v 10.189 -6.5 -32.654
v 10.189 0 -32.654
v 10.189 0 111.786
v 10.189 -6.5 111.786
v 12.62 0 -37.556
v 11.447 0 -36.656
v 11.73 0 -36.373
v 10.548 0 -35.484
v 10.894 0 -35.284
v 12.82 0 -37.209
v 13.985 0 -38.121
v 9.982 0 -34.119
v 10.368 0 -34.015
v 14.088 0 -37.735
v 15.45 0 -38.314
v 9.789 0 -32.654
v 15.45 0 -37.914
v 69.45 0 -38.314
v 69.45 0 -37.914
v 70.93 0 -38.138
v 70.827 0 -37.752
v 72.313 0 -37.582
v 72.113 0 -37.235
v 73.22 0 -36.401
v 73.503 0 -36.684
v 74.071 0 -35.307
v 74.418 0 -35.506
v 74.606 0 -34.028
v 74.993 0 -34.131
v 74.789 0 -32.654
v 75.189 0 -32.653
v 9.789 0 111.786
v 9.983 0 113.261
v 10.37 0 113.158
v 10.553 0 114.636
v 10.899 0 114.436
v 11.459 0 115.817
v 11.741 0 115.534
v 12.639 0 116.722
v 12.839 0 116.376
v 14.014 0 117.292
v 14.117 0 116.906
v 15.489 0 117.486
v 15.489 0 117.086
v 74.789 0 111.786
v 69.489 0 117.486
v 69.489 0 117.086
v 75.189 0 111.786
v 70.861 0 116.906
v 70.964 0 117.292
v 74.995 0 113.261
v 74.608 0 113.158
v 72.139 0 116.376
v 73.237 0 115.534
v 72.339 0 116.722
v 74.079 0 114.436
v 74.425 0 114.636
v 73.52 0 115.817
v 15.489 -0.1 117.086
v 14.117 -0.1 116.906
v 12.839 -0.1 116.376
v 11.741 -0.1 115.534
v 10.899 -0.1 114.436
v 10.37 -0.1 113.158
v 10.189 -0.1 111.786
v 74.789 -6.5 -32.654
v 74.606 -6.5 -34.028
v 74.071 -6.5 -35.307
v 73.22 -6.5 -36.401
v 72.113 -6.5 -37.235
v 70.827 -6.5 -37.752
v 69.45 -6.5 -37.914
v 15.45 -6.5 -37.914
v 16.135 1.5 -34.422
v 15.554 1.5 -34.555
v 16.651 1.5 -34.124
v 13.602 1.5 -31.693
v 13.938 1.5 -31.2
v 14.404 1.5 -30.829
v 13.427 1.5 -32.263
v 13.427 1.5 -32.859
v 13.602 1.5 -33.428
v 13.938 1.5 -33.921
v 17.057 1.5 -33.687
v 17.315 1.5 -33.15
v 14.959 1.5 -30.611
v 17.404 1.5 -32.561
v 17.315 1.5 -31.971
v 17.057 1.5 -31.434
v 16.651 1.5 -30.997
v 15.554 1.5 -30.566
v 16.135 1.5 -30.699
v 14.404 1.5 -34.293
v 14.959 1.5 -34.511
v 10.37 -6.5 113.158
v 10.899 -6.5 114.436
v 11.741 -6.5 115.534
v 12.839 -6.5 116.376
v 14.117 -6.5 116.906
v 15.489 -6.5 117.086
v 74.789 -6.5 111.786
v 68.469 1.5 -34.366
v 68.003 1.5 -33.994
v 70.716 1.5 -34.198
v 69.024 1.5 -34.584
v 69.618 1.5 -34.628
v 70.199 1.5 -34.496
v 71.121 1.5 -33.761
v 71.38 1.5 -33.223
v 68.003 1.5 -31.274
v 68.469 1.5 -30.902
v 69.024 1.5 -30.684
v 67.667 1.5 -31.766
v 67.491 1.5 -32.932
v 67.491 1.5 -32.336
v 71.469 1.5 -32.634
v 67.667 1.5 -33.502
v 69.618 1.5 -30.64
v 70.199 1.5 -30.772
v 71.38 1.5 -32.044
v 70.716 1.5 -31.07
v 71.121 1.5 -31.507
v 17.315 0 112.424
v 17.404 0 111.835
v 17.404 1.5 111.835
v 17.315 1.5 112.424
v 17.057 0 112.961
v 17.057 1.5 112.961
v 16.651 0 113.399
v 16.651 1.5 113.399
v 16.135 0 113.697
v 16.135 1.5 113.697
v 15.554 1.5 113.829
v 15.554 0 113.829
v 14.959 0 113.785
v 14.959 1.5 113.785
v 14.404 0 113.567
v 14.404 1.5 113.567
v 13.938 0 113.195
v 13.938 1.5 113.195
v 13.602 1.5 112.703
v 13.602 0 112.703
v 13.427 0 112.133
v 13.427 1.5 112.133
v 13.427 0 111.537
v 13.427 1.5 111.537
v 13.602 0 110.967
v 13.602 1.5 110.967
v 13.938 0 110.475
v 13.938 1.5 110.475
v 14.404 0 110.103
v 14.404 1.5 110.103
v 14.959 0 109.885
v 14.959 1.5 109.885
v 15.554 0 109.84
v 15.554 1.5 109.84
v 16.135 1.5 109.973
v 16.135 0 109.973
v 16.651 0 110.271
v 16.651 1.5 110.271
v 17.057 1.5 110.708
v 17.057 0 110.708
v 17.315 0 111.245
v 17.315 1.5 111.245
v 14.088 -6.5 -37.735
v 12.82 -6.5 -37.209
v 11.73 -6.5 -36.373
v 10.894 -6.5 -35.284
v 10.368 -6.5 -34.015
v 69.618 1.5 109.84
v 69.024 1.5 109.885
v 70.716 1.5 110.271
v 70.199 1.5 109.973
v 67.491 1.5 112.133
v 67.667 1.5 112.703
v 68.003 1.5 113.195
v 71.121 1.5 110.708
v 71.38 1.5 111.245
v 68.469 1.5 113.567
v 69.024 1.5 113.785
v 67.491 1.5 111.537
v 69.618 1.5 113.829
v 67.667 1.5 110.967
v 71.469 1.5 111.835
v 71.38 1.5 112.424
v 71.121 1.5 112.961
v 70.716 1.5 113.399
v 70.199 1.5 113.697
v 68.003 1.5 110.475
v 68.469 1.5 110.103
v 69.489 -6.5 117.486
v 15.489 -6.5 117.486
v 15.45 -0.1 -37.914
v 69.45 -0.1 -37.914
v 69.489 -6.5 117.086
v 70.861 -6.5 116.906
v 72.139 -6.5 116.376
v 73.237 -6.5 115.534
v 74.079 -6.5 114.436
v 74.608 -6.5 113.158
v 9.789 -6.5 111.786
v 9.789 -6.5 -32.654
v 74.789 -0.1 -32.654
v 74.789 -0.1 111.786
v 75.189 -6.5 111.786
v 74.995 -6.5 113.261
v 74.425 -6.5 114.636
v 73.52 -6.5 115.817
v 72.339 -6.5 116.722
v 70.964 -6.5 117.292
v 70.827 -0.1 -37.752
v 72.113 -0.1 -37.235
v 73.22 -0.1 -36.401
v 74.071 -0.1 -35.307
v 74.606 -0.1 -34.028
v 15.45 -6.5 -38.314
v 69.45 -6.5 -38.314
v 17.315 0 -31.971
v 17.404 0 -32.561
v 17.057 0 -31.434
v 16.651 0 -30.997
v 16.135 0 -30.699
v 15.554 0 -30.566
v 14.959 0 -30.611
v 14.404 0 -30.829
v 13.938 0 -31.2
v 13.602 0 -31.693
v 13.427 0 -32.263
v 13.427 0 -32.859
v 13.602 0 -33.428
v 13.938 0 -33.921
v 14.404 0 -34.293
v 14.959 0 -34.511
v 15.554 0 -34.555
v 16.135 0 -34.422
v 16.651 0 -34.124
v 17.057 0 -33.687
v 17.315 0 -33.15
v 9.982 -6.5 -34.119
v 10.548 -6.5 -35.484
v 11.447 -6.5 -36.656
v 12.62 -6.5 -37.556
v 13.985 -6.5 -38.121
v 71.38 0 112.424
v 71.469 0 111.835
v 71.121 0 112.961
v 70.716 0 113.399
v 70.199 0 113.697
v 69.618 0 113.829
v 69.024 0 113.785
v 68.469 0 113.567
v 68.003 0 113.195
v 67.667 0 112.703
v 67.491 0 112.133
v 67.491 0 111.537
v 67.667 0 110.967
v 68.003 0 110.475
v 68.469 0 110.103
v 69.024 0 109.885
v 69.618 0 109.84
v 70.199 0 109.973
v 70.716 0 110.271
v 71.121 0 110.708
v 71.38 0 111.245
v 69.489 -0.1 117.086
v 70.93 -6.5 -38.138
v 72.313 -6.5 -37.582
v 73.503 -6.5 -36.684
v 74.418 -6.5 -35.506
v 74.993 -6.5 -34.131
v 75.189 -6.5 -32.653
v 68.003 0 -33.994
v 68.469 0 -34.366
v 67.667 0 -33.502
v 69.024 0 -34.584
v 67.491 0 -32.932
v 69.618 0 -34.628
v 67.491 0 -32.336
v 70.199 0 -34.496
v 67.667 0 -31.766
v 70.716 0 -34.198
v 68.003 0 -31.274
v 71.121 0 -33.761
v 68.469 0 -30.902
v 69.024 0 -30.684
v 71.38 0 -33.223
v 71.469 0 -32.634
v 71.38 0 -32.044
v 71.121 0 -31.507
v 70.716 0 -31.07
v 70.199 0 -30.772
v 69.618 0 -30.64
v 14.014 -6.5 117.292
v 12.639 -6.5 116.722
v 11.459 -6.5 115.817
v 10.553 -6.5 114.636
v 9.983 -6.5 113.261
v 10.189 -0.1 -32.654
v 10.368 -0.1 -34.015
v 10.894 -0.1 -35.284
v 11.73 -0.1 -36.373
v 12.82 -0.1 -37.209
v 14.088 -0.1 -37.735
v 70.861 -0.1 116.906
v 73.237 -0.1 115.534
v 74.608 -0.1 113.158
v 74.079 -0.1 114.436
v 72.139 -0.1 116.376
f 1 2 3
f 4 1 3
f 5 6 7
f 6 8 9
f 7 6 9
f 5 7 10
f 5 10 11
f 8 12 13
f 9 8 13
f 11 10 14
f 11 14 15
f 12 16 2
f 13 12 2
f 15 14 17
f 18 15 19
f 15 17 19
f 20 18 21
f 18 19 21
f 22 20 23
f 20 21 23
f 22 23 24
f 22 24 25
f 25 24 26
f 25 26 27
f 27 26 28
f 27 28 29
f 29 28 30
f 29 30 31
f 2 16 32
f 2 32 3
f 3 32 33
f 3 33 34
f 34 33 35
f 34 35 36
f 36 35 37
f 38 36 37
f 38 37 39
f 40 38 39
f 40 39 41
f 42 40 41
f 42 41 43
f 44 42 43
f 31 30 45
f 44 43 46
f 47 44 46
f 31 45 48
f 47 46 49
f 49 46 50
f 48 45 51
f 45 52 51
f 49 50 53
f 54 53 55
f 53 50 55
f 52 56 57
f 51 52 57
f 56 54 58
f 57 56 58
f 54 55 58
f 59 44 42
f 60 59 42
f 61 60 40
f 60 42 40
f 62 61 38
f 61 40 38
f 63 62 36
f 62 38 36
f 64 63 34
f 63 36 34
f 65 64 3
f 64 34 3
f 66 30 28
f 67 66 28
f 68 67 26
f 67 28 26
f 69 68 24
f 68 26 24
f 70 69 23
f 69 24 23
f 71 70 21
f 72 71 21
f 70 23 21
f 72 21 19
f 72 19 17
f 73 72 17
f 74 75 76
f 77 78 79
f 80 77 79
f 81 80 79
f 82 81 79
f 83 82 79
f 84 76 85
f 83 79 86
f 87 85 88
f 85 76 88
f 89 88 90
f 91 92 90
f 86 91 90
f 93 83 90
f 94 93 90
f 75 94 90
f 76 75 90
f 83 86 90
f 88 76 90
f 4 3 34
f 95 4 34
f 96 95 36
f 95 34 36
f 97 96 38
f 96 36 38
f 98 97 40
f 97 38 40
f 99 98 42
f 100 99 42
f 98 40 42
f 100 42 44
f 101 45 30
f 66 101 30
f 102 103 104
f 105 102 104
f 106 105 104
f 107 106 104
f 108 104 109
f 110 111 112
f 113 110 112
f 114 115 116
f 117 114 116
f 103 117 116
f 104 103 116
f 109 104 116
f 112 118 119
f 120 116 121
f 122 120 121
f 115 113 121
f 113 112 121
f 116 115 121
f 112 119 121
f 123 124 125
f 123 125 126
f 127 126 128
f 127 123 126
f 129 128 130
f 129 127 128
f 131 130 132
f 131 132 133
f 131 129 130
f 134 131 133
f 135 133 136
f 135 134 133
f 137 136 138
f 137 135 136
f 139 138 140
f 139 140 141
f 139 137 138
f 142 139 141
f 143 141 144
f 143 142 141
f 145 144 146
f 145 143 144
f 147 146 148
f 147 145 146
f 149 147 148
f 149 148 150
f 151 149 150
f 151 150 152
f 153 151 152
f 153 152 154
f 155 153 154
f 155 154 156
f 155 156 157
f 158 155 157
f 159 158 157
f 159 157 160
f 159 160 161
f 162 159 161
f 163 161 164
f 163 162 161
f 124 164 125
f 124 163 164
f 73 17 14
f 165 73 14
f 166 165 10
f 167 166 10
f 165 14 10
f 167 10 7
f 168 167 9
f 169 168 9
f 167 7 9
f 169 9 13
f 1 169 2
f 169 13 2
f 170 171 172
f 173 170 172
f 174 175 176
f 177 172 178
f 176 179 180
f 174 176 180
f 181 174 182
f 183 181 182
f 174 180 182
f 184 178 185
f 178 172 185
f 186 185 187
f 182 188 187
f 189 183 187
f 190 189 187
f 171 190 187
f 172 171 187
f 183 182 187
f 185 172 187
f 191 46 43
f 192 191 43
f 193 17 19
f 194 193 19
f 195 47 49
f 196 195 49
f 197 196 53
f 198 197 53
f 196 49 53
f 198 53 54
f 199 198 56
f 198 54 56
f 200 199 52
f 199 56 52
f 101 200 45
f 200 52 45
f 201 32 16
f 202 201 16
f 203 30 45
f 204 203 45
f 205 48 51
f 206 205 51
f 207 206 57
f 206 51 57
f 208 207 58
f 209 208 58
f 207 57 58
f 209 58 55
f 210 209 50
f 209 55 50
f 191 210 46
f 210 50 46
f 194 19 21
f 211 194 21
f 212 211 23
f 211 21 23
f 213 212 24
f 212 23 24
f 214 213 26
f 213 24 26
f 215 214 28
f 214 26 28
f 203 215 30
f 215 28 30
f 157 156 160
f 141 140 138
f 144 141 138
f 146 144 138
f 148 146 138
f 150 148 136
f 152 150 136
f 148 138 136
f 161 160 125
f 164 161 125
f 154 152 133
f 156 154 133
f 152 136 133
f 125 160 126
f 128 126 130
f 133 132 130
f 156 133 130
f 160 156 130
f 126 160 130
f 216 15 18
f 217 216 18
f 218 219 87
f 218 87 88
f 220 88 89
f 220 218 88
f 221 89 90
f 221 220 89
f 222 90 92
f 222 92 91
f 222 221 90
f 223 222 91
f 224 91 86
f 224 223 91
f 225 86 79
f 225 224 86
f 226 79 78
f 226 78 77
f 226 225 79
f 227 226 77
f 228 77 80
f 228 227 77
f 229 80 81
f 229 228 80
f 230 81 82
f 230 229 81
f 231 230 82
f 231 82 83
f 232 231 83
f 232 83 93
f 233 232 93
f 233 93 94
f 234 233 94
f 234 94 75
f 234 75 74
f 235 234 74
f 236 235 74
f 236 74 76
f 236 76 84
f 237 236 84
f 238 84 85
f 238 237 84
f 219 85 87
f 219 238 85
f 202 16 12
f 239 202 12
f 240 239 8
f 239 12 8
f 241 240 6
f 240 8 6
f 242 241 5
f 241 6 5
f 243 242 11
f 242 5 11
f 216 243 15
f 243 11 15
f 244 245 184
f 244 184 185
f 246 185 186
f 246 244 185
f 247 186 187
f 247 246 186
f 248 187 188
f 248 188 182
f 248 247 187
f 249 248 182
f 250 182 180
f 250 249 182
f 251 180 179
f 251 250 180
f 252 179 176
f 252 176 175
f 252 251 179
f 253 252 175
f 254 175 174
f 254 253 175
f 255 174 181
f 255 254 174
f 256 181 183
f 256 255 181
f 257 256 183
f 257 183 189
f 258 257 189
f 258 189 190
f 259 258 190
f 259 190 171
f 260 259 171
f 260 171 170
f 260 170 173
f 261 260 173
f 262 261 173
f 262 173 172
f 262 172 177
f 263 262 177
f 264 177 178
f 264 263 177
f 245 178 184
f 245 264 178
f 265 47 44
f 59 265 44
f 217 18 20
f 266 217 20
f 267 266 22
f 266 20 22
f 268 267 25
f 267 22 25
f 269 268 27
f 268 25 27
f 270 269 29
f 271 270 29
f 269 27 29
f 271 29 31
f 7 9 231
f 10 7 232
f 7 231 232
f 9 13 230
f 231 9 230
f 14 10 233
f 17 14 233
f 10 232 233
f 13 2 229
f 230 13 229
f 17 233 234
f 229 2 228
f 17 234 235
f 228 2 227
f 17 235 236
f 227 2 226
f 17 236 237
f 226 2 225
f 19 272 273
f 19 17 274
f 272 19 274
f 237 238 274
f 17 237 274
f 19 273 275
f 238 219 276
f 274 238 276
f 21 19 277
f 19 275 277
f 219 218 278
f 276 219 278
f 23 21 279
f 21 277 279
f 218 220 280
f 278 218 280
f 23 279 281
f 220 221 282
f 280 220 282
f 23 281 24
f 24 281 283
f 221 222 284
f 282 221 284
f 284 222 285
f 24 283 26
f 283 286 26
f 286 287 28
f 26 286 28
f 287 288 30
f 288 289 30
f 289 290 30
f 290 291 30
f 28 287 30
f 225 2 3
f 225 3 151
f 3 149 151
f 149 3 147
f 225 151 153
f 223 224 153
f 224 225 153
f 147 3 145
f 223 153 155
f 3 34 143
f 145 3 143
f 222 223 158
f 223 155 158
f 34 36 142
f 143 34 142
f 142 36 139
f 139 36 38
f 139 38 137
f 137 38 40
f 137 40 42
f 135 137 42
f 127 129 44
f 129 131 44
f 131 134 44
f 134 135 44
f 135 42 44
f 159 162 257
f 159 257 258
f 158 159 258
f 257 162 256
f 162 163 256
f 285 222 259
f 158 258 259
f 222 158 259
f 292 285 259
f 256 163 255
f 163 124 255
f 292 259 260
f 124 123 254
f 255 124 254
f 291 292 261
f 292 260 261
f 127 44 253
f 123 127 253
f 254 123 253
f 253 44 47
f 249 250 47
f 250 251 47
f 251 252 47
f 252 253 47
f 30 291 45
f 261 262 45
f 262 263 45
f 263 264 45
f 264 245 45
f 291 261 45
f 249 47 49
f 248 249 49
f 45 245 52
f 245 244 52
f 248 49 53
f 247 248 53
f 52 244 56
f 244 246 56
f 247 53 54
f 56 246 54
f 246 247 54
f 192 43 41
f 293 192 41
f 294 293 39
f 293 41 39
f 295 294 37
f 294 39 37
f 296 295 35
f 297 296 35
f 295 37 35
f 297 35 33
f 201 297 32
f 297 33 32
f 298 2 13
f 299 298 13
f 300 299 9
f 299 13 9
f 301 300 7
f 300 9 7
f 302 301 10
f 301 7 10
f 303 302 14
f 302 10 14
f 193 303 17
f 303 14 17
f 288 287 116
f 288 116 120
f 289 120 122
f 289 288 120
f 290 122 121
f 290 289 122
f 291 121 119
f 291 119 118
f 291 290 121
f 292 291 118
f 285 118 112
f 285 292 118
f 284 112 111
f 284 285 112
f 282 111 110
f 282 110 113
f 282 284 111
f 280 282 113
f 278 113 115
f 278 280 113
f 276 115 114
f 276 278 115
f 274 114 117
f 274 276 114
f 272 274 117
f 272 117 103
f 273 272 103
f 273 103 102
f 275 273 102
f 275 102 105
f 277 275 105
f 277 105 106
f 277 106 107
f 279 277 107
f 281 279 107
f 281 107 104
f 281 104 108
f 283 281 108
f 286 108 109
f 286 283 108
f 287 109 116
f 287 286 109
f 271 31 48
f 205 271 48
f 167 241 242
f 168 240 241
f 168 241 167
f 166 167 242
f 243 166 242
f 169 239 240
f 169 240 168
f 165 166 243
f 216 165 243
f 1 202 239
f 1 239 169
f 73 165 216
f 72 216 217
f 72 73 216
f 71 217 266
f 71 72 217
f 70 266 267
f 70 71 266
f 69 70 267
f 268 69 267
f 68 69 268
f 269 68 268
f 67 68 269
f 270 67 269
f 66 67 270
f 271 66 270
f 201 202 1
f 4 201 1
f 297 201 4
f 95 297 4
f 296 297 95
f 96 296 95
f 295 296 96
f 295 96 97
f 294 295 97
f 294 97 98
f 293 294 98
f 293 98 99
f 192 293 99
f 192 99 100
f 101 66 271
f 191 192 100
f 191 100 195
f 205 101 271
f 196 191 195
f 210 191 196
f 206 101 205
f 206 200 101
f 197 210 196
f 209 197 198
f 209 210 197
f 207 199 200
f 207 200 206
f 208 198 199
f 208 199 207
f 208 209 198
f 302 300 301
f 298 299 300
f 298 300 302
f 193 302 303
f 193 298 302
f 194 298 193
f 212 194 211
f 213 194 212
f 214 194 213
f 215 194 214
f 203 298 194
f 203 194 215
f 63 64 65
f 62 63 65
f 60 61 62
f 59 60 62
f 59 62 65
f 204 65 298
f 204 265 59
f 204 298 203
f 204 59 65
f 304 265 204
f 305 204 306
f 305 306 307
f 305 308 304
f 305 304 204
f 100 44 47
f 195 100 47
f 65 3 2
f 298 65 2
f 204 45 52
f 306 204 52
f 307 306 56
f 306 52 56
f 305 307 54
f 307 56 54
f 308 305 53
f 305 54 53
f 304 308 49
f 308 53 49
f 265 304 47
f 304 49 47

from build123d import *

# Parameters (mm, degrees)
F2_DEPTH = 6.5
F3_DEPTH = 0.1
F1_R     = 2
F4_DEPTH = 1.5


with BuildPart() as f2:
    # F0 (on Front) → F2 (new body)
    with BuildSketch(Plane.XZ):
        with BuildLine():
            Line((9.789024, 111.786183), (9.789024, -32.653514))
            ThreePointArc((9.789024, -32.653514), (11.447287, -36.656048), (15.449991, -38.313902))
            Line((15.449991, -38.313902), (69.449991, -38.313943))
            ThreePointArc((69.449991, -38.313943), (73.503284, -36.683913), (75.189024, -32.65347))
            Line((75.189024, -32.65347), (75.189024, 111.786183))
            ThreePointArc((75.189024, 111.786183), (73.519525, 115.816634), (69.489059, 117.486098))
            Line((69.489059, 117.486098), (15.489059, 117.486098))
            ThreePointArc((15.489059, 117.486098), (11.458568, 115.816639), (9.789024, 111.786183))
        make_face()
        with BuildLine():
            Line((10.189024, -32.653514), (10.189024, 111.786183))
            ThreePointArc((10.189024, 111.786183), (11.741411, 115.533796), (15.489059, 117.086098))
            Line((15.489059, 117.086098), (69.489059, 117.086098))
            ThreePointArc((69.489059, 117.086098), (73.236682, 115.533792), (74.789024, 111.786183))
            Line((74.789024, 111.786183), (74.789024, -32.653514))
            ThreePointArc((74.789024, -32.653514), (73.220418, -36.401079), (69.449991, -37.913902))
            Line((69.449991, -37.913902), (15.449991, -37.913902))
            ThreePointArc((15.449991, -37.913902), (11.73013, -36.373205), (10.189024, -32.653514))
        make_face(mode=Mode.SUBTRACT)
    extrude(amount=F2_DEPTH)


with BuildPart() as f3:
    # F0 (on Front) → F3 (new body)
    with BuildSketch(Plane.XZ):
        with BuildLine():
            ThreePointArc((15.489059, 117.086098), (11.741411, 115.533796), (10.189024, 111.786183))
            Line((10.189024, 111.786183), (10.189024, -32.653514))
            ThreePointArc((10.189024, -32.653514), (11.73013, -36.373205), (15.449991, -37.913902))
            Line((15.449991, -37.913902), (69.449991, -37.913902))
            ThreePointArc((69.449991, -37.913902), (73.220418, -36.401079), (74.789024, -32.653514))
            Line((74.789024, -32.653514), (74.789024, 111.786183))
            ThreePointArc((74.789024, 111.786183), (73.236682, 115.533792), (69.489059, 117.086098))
            Line((69.489059, 117.086098), (15.489059, 117.086098))
        make_face()
    extrude(amount=F3_DEPTH)

    # F1 (on Front) → F4 (join)
    with BuildSketch(Plane.XZ):
        with Locations((15.404275, -32.560658)):
            Circle(F1_R)
        with Locations((69.468722, -32.633983)):
            Circle(F1_R)
        with Locations((69.468722, 111.834854)):
            Circle(F1_R)
        with Locations((15.404275, 111.834854)):
            Circle(F1_R)
    extrude(amount=-F4_DEPTH)


solid = Compound([f2.part, f3.part])
